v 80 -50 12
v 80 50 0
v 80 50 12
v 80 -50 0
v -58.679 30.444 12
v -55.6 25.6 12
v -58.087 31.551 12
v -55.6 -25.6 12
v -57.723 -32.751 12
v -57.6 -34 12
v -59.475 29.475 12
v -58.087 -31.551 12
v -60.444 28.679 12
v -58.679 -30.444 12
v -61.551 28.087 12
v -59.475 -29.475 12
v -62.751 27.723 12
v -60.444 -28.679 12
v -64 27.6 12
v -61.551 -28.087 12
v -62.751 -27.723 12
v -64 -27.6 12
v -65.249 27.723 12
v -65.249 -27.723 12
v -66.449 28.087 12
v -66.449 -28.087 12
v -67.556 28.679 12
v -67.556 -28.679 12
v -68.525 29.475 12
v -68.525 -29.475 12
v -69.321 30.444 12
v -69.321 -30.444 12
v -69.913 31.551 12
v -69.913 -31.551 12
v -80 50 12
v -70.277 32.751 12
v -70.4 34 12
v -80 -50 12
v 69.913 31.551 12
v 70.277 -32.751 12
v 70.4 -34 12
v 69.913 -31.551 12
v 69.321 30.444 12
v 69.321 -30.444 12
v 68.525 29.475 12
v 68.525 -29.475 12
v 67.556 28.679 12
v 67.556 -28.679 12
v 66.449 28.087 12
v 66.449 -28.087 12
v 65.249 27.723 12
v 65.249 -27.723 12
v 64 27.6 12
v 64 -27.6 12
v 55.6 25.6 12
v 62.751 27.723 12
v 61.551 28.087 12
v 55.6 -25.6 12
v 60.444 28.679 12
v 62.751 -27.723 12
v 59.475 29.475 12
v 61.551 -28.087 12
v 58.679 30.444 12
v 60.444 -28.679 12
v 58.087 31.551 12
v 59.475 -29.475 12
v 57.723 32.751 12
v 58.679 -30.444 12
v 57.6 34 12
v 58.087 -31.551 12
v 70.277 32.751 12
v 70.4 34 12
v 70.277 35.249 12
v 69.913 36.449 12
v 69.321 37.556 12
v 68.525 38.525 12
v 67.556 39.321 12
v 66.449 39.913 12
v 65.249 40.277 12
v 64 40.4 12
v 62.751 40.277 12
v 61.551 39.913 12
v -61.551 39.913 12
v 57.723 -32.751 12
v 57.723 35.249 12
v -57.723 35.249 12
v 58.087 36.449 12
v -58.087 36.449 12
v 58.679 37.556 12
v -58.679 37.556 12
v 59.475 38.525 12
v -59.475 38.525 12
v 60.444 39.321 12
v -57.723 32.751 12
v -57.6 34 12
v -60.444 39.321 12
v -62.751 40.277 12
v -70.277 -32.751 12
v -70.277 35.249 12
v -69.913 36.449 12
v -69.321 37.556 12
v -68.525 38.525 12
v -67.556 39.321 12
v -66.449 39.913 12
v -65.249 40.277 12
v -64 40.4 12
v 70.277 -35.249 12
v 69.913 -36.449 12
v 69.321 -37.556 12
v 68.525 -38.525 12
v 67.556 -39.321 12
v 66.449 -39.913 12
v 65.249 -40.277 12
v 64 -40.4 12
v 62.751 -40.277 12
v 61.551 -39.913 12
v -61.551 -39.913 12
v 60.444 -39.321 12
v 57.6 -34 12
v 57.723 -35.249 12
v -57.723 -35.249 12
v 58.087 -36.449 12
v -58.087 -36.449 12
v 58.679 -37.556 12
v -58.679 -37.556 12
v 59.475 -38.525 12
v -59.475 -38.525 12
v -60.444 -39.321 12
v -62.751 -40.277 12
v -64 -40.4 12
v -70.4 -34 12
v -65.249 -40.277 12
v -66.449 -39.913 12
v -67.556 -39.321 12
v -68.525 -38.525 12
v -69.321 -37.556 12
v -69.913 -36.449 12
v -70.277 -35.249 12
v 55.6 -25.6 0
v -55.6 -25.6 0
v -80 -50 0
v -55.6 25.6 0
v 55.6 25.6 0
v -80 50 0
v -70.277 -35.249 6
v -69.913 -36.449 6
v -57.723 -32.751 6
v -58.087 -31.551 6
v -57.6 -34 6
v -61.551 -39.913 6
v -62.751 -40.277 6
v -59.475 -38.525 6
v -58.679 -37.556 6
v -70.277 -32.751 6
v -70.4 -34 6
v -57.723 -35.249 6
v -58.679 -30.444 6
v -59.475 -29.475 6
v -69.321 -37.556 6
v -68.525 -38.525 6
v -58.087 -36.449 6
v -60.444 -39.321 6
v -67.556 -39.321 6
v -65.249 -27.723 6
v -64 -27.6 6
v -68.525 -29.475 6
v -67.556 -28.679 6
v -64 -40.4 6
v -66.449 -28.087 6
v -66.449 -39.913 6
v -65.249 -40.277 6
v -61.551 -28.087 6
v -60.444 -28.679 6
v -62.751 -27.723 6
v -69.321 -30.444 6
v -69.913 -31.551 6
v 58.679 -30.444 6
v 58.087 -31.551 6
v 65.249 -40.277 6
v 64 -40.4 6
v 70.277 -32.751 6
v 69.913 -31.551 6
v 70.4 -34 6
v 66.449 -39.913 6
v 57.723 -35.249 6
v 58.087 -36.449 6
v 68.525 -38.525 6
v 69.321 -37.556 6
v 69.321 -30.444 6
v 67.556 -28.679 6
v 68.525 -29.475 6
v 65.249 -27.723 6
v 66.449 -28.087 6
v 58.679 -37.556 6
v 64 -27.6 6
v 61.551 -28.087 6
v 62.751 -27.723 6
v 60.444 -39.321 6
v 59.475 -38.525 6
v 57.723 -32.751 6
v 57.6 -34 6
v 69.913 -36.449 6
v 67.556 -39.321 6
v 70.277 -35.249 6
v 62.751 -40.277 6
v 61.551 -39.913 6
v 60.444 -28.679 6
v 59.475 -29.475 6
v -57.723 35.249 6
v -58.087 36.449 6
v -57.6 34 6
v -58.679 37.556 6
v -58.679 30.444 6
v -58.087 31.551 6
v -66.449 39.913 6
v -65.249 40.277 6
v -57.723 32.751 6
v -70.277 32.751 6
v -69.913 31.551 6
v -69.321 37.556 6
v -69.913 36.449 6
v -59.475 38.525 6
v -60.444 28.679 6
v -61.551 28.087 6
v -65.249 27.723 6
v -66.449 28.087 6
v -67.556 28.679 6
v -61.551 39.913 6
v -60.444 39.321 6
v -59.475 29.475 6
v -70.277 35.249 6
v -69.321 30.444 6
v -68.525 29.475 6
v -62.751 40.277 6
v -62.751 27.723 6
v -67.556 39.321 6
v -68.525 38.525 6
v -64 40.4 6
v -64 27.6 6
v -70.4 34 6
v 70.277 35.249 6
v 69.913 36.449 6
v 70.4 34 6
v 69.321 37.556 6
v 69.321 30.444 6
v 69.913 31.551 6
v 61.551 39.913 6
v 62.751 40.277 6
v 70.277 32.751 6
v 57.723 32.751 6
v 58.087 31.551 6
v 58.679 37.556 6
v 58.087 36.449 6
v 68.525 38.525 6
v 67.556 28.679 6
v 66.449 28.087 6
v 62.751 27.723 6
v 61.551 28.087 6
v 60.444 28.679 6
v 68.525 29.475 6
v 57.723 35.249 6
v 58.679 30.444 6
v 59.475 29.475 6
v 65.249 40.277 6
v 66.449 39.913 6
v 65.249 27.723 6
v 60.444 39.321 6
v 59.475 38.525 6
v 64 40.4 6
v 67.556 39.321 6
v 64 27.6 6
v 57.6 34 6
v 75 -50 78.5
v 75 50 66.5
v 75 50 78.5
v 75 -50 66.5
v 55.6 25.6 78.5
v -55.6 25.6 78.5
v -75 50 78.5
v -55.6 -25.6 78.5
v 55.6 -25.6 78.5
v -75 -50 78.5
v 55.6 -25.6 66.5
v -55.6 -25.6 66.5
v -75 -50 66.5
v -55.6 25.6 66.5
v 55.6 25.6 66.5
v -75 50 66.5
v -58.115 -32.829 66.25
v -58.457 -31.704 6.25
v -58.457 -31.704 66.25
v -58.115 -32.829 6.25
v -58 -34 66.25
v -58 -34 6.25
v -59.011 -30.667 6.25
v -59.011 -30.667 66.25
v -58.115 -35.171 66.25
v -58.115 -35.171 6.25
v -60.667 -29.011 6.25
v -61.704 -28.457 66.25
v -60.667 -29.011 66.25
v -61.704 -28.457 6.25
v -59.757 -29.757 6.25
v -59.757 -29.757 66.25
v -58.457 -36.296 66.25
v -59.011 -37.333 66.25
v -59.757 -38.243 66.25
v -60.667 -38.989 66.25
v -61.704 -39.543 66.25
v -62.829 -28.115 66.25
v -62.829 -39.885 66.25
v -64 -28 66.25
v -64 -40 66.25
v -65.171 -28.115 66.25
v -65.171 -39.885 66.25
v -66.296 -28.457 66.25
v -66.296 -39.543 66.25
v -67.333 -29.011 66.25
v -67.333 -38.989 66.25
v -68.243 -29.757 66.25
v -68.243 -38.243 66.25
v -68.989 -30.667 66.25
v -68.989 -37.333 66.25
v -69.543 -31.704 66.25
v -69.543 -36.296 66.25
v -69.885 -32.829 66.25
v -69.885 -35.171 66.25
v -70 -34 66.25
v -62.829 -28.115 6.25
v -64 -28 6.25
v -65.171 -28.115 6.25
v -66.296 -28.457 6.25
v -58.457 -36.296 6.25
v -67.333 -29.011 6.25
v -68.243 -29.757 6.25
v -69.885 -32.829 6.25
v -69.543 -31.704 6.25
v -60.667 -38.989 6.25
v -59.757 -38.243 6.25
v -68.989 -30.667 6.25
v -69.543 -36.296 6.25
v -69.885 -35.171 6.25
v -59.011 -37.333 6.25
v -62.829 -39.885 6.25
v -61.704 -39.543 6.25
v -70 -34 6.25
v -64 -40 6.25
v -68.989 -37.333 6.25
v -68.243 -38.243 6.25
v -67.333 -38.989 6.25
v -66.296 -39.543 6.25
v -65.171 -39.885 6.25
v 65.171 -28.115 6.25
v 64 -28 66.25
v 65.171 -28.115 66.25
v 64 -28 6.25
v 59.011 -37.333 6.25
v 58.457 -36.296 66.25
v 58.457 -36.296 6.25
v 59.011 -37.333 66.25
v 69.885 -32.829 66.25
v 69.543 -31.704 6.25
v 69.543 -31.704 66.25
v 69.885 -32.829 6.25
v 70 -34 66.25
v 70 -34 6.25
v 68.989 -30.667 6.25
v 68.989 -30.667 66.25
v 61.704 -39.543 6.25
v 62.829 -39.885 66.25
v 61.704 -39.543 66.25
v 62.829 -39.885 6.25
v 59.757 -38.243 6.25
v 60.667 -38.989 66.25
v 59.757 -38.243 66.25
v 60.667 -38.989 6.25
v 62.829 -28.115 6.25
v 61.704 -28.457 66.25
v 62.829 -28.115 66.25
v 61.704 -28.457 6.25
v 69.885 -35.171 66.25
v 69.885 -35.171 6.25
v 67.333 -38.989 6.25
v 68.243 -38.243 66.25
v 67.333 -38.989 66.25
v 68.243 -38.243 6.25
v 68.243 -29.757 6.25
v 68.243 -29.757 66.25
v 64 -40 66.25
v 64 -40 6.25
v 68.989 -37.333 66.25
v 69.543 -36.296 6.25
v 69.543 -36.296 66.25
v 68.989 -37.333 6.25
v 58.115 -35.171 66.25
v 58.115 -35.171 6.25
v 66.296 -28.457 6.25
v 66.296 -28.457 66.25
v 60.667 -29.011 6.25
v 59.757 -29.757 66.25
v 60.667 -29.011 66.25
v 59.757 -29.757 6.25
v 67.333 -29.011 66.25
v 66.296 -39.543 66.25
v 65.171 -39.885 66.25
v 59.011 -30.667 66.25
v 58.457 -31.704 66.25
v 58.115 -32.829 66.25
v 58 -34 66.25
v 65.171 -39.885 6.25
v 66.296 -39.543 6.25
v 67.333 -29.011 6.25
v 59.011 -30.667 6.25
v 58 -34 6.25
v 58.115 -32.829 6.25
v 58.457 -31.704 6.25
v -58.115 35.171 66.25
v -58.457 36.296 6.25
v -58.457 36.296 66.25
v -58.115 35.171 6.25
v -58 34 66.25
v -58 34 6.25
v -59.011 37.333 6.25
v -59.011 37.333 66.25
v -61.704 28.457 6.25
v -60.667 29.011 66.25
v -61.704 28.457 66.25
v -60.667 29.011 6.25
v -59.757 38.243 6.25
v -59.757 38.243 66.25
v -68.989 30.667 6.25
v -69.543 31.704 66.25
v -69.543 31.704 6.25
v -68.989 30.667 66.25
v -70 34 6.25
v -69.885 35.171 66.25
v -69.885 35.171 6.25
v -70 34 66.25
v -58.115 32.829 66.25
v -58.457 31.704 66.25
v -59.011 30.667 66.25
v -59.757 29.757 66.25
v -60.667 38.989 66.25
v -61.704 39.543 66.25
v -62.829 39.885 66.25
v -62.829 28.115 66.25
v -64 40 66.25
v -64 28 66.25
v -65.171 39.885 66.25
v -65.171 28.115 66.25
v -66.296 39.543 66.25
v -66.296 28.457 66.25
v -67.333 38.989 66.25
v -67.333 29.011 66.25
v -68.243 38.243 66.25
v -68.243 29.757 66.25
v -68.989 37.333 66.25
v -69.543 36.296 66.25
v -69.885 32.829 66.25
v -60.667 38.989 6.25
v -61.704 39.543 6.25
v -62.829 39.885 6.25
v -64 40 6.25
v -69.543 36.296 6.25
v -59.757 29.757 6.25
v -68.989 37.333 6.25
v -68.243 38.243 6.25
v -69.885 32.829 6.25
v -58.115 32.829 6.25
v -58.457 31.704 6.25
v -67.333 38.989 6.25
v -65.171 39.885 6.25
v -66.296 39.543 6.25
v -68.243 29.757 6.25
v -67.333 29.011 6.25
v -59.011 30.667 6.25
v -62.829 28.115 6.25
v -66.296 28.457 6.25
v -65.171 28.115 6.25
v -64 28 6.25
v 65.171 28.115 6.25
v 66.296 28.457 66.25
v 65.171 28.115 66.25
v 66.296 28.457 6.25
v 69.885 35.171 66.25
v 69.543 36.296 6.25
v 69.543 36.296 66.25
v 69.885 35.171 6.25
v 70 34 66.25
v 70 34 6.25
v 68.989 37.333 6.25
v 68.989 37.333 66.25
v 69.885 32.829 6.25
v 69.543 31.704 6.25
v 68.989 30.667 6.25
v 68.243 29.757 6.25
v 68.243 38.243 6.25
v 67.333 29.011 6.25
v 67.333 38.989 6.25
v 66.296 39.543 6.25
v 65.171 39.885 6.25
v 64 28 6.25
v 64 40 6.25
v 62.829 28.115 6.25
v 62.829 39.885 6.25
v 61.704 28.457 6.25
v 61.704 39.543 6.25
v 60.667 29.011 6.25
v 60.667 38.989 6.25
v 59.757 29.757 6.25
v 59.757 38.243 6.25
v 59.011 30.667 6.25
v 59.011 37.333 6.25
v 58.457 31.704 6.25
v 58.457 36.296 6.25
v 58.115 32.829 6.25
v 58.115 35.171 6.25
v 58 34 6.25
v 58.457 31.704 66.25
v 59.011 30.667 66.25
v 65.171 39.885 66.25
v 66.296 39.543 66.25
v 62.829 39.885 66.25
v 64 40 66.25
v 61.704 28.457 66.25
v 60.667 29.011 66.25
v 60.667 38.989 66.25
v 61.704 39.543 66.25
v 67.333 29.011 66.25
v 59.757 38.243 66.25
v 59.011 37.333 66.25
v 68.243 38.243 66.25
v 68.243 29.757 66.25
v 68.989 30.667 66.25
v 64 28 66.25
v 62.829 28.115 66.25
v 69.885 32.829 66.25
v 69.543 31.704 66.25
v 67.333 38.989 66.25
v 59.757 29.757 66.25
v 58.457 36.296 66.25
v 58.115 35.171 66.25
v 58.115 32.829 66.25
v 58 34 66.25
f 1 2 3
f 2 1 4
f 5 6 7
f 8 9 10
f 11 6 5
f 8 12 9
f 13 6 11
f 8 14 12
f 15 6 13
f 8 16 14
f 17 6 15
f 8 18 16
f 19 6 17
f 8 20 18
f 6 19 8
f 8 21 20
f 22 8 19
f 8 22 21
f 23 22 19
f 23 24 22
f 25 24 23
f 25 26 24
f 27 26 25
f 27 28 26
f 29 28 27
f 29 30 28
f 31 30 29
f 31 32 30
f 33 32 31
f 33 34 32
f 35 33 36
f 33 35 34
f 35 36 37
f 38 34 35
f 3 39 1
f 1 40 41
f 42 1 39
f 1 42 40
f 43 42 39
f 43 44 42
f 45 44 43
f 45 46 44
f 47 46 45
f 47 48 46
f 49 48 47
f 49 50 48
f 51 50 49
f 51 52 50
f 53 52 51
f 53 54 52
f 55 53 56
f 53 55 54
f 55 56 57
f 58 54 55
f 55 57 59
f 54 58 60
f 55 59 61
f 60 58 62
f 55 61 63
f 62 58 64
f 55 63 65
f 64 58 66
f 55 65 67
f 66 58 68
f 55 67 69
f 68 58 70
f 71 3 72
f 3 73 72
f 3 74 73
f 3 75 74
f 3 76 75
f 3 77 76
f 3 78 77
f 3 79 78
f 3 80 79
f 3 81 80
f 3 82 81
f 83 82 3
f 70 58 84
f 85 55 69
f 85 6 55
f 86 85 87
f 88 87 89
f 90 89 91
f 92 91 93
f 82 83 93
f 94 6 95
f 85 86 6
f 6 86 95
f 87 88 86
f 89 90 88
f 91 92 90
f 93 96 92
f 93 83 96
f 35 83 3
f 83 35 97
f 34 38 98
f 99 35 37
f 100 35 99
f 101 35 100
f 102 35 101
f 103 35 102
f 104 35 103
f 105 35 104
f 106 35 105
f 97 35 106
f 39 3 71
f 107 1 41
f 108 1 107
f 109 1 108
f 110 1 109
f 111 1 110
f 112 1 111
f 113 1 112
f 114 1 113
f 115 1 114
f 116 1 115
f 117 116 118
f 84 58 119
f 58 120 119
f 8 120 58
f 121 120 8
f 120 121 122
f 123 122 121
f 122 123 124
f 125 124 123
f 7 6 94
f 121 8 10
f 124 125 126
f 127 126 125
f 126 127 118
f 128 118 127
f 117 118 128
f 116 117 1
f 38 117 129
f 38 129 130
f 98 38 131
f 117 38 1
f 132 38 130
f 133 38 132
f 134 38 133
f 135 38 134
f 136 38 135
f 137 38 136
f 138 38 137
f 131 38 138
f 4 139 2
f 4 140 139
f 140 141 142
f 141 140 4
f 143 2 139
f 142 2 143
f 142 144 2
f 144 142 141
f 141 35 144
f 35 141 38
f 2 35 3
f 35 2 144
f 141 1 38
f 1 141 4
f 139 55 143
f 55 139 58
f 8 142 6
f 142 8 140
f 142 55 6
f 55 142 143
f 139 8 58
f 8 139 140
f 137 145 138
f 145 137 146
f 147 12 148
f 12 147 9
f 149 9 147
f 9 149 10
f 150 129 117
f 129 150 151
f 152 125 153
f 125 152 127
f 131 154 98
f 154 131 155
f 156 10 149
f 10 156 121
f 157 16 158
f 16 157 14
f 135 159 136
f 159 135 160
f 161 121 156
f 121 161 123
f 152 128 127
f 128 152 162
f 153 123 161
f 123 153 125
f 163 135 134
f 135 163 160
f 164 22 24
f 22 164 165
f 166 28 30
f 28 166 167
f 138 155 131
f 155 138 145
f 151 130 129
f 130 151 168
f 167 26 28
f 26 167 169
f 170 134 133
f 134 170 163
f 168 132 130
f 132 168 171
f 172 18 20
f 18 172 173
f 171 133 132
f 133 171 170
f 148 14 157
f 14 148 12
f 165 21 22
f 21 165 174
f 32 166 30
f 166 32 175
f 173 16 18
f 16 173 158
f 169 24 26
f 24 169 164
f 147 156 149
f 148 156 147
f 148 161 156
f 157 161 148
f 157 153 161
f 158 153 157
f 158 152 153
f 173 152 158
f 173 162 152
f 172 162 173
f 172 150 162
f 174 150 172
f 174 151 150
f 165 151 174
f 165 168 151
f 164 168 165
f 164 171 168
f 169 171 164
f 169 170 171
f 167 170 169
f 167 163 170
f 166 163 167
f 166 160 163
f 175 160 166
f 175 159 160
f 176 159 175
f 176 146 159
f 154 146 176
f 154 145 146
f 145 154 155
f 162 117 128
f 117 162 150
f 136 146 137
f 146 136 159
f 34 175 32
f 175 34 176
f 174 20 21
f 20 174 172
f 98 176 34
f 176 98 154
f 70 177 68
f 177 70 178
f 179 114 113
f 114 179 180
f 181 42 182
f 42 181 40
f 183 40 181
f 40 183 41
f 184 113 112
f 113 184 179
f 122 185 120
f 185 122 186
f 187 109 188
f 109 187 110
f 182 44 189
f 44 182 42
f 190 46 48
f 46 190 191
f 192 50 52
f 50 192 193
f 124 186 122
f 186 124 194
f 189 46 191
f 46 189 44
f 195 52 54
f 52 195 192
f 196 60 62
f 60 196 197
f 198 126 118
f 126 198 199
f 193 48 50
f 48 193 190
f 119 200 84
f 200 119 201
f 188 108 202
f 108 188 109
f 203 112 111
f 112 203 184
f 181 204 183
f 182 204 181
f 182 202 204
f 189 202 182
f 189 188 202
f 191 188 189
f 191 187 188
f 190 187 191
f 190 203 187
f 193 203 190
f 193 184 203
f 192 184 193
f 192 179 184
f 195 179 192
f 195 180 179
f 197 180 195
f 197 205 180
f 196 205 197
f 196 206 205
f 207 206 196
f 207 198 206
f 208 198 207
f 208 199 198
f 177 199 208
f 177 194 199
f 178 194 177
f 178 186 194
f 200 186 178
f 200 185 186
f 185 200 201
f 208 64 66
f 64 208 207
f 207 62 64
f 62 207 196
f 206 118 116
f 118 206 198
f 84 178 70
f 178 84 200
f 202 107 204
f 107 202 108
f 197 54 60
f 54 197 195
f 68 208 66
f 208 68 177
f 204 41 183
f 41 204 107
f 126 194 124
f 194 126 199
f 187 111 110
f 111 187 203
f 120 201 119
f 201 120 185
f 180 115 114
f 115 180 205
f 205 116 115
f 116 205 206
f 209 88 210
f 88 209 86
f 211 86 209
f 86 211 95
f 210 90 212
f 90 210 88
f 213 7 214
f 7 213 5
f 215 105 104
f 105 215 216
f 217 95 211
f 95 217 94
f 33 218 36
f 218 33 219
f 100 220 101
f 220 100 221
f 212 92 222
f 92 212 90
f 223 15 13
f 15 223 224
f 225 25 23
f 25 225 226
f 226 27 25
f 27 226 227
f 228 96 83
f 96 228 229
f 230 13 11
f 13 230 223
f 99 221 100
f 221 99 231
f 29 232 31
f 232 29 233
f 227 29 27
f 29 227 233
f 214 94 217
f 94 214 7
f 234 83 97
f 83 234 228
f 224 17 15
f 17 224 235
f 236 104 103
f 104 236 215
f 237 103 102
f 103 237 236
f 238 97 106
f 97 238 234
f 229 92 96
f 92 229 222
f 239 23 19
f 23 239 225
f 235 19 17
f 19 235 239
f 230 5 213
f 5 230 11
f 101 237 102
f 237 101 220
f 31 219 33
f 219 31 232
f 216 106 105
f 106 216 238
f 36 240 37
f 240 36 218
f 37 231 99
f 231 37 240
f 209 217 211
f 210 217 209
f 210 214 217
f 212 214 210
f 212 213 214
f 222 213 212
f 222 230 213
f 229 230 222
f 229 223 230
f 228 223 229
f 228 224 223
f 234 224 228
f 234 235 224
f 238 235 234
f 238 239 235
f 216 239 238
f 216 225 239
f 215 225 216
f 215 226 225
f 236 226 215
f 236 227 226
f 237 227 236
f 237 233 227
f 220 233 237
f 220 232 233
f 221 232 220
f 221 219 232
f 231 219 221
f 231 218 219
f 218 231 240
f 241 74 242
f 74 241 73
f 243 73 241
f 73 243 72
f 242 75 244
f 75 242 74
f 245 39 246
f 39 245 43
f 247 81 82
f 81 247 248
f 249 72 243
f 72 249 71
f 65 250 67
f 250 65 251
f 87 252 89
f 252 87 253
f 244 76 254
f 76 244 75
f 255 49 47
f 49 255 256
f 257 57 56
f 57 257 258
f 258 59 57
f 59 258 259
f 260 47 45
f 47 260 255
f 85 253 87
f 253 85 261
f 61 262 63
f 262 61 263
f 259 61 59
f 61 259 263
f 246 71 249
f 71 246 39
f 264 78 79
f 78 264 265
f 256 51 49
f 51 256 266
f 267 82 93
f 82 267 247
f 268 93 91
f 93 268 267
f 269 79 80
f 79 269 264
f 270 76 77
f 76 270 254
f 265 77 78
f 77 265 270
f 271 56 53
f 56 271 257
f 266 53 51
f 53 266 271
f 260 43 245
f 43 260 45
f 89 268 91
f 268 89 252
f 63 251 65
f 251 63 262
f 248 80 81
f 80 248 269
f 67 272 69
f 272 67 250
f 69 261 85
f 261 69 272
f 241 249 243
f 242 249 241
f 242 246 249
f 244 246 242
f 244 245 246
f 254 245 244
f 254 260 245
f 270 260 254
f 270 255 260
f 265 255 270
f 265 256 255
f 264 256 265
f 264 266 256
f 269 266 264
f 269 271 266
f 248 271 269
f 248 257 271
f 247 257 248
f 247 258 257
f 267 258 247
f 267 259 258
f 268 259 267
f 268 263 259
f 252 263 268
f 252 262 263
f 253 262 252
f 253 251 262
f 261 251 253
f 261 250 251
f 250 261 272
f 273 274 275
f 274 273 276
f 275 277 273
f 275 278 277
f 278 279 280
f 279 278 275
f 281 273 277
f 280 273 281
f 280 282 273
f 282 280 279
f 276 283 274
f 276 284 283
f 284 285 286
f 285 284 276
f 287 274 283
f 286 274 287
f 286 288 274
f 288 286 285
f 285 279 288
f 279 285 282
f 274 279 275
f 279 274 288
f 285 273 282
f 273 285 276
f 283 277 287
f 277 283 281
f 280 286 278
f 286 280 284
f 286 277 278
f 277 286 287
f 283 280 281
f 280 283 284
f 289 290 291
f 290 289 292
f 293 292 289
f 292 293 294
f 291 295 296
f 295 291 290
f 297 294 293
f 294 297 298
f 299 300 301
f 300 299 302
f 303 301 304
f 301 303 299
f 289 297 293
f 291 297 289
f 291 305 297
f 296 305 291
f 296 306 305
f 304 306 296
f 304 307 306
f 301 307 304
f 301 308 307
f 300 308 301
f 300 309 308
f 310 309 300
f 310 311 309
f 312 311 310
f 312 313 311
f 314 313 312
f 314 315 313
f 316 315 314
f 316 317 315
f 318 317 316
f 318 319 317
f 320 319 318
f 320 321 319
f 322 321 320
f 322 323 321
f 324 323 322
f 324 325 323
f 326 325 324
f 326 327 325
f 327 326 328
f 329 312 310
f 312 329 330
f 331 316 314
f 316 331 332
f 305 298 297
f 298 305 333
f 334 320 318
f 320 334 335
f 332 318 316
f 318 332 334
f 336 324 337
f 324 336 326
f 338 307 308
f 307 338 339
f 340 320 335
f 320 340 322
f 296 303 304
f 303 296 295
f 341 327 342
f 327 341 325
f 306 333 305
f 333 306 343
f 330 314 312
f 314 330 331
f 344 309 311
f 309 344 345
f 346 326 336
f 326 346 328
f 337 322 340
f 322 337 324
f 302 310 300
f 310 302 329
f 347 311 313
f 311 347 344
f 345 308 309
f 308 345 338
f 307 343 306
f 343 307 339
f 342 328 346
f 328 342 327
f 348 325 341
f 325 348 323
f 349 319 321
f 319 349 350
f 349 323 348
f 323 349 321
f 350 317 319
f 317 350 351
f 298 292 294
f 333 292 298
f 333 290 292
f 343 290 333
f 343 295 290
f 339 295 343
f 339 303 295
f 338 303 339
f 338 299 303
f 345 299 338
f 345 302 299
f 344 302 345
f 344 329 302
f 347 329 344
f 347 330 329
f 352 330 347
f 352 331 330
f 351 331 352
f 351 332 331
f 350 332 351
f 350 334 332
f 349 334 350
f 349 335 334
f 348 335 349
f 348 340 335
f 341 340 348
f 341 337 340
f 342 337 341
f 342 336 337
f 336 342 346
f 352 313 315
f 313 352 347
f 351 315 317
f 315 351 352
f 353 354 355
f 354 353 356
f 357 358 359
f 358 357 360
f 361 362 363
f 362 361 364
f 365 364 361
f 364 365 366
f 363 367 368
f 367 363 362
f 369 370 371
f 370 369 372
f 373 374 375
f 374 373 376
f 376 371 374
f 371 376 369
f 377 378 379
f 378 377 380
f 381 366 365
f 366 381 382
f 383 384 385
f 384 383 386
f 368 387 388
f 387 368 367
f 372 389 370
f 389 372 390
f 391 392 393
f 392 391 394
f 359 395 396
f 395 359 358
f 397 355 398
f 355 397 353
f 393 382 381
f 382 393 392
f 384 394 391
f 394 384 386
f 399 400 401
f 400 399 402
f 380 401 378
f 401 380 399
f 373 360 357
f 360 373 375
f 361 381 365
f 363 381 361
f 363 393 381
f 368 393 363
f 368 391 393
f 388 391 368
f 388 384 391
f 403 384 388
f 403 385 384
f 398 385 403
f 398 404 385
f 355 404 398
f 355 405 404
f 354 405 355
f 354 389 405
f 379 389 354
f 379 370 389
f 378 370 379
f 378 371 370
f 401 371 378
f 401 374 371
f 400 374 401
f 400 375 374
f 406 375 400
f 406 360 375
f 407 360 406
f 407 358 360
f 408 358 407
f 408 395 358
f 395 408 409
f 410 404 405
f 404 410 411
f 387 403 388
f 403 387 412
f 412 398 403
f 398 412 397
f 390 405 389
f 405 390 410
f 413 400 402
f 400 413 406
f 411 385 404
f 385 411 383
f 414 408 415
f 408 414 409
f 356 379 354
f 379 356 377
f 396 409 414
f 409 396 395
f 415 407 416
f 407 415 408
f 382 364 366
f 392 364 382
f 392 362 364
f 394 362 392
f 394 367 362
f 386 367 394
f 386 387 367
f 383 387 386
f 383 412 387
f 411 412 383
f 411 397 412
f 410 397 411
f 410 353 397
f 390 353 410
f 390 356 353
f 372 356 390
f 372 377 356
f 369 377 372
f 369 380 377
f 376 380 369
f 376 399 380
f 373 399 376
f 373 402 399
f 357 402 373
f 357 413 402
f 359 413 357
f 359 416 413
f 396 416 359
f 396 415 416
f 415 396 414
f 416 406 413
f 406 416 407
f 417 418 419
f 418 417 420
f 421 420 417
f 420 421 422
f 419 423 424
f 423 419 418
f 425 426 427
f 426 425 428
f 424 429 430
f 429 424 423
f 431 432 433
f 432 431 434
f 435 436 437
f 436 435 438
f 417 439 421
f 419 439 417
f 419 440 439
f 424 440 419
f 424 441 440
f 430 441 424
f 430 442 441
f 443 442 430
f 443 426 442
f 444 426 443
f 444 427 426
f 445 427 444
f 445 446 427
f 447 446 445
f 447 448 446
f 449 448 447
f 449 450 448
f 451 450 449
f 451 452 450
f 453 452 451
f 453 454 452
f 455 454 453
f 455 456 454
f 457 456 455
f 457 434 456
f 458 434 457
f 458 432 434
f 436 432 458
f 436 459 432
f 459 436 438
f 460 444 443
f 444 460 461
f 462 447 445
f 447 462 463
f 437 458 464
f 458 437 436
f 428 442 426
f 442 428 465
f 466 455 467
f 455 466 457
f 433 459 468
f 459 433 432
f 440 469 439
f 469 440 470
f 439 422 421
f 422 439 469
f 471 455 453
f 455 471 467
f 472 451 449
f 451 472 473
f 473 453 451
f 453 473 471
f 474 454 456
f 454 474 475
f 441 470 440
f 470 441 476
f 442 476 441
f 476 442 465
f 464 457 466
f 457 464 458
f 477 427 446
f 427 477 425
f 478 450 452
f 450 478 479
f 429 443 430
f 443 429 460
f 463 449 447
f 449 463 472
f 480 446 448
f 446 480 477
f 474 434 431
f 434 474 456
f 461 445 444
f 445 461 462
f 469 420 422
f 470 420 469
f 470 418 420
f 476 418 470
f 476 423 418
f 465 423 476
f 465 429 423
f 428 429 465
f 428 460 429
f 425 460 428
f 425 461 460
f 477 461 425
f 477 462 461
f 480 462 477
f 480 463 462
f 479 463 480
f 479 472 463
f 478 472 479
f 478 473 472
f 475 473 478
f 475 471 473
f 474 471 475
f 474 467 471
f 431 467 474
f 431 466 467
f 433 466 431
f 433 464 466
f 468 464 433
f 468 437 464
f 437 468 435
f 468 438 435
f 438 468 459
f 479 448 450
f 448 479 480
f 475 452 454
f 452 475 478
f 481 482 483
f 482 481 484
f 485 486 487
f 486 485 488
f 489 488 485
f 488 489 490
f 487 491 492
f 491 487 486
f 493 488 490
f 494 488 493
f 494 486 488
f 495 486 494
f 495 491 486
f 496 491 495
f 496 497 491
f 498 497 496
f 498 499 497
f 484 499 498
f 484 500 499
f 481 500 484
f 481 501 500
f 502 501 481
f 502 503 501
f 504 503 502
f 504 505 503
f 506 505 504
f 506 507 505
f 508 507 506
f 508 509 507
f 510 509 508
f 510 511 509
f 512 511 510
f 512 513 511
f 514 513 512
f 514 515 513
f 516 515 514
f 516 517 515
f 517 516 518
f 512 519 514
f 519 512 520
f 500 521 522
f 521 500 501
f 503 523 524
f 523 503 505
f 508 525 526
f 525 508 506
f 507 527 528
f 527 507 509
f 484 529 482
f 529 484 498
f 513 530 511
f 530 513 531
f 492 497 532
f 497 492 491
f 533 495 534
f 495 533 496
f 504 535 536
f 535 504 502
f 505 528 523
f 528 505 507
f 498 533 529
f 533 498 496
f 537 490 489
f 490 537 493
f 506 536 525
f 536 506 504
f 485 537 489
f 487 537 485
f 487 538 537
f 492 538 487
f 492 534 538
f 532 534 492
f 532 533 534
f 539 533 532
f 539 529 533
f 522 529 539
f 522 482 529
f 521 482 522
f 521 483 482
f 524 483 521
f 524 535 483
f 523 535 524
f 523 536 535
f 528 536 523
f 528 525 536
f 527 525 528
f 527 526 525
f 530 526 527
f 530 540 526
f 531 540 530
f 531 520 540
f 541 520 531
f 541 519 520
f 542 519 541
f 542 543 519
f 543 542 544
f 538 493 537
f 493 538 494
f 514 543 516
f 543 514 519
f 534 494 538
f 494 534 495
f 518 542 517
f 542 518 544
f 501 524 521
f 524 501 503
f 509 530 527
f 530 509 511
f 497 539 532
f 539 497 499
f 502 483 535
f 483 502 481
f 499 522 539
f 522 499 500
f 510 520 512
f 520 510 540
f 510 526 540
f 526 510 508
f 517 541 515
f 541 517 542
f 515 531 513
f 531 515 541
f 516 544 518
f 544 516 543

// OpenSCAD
$fn = 32;

// ------------------------------------------------------------------------
// Frame cube: base 160 x 100 mm, posts 60 mm tall
// Every part is its own module, assembly() places every instance.
// ------------------------------------------------------------------------

// --- part 1 ---
module base_frame() {
  difference() {
    translate([-80, -50, 0]) cube([160, 100, 12]);
    translate([-55.6, -25.6, -1]) cube([111.2, 51.2, 14]);
    translate([-64, -34, 6]) cylinder(h = 7, d = 12.8);
    translate([64, -34, 6]) cylinder(h = 7, d = 12.8);
    translate([-64, 34, 6]) cylinder(h = 7, d = 12.8);
    translate([64, 34, 6]) cylinder(h = 7, d = 12.8);
  }
}

// --- part 2 ---
module corner_post() {
  cylinder(h = 60, d = 12);
}

// --- part 3 ---
module top_frame() {
  difference() {
    translate([-75, -50, 0]) cube([150, 100, 12]);
    translate([-55.6, -25.6, -1]) cube([111.2, 51.2, 14]);
  }
}

// --- assembly ---
module assembly() {
  color([0.80, 0.24, 0.20]) translate([0, 0, 0]) rotate([0, 0, 0]) base_frame();
  color([0.20, 0.45, 0.75]) translate([-64, -34, 6.25]) rotate([0, 0, 0]) corner_post();
  color([0.25, 0.62, 0.32]) translate([64, -34, 6.25]) rotate([0, 0, 0]) corner_post();
  color([0.92, 0.70, 0.18]) translate([-64, 34, 6.25]) rotate([0, 0, 0]) corner_post();
  color([0.58, 0.35, 0.70]) translate([64, 34, 6.25]) rotate([0, 0, 0]) corner_post();
  color([0.16, 0.66, 0.66]) translate([0, 0, 66.5]) rotate([0, 0, 0]) top_frame();
}

assembly();
